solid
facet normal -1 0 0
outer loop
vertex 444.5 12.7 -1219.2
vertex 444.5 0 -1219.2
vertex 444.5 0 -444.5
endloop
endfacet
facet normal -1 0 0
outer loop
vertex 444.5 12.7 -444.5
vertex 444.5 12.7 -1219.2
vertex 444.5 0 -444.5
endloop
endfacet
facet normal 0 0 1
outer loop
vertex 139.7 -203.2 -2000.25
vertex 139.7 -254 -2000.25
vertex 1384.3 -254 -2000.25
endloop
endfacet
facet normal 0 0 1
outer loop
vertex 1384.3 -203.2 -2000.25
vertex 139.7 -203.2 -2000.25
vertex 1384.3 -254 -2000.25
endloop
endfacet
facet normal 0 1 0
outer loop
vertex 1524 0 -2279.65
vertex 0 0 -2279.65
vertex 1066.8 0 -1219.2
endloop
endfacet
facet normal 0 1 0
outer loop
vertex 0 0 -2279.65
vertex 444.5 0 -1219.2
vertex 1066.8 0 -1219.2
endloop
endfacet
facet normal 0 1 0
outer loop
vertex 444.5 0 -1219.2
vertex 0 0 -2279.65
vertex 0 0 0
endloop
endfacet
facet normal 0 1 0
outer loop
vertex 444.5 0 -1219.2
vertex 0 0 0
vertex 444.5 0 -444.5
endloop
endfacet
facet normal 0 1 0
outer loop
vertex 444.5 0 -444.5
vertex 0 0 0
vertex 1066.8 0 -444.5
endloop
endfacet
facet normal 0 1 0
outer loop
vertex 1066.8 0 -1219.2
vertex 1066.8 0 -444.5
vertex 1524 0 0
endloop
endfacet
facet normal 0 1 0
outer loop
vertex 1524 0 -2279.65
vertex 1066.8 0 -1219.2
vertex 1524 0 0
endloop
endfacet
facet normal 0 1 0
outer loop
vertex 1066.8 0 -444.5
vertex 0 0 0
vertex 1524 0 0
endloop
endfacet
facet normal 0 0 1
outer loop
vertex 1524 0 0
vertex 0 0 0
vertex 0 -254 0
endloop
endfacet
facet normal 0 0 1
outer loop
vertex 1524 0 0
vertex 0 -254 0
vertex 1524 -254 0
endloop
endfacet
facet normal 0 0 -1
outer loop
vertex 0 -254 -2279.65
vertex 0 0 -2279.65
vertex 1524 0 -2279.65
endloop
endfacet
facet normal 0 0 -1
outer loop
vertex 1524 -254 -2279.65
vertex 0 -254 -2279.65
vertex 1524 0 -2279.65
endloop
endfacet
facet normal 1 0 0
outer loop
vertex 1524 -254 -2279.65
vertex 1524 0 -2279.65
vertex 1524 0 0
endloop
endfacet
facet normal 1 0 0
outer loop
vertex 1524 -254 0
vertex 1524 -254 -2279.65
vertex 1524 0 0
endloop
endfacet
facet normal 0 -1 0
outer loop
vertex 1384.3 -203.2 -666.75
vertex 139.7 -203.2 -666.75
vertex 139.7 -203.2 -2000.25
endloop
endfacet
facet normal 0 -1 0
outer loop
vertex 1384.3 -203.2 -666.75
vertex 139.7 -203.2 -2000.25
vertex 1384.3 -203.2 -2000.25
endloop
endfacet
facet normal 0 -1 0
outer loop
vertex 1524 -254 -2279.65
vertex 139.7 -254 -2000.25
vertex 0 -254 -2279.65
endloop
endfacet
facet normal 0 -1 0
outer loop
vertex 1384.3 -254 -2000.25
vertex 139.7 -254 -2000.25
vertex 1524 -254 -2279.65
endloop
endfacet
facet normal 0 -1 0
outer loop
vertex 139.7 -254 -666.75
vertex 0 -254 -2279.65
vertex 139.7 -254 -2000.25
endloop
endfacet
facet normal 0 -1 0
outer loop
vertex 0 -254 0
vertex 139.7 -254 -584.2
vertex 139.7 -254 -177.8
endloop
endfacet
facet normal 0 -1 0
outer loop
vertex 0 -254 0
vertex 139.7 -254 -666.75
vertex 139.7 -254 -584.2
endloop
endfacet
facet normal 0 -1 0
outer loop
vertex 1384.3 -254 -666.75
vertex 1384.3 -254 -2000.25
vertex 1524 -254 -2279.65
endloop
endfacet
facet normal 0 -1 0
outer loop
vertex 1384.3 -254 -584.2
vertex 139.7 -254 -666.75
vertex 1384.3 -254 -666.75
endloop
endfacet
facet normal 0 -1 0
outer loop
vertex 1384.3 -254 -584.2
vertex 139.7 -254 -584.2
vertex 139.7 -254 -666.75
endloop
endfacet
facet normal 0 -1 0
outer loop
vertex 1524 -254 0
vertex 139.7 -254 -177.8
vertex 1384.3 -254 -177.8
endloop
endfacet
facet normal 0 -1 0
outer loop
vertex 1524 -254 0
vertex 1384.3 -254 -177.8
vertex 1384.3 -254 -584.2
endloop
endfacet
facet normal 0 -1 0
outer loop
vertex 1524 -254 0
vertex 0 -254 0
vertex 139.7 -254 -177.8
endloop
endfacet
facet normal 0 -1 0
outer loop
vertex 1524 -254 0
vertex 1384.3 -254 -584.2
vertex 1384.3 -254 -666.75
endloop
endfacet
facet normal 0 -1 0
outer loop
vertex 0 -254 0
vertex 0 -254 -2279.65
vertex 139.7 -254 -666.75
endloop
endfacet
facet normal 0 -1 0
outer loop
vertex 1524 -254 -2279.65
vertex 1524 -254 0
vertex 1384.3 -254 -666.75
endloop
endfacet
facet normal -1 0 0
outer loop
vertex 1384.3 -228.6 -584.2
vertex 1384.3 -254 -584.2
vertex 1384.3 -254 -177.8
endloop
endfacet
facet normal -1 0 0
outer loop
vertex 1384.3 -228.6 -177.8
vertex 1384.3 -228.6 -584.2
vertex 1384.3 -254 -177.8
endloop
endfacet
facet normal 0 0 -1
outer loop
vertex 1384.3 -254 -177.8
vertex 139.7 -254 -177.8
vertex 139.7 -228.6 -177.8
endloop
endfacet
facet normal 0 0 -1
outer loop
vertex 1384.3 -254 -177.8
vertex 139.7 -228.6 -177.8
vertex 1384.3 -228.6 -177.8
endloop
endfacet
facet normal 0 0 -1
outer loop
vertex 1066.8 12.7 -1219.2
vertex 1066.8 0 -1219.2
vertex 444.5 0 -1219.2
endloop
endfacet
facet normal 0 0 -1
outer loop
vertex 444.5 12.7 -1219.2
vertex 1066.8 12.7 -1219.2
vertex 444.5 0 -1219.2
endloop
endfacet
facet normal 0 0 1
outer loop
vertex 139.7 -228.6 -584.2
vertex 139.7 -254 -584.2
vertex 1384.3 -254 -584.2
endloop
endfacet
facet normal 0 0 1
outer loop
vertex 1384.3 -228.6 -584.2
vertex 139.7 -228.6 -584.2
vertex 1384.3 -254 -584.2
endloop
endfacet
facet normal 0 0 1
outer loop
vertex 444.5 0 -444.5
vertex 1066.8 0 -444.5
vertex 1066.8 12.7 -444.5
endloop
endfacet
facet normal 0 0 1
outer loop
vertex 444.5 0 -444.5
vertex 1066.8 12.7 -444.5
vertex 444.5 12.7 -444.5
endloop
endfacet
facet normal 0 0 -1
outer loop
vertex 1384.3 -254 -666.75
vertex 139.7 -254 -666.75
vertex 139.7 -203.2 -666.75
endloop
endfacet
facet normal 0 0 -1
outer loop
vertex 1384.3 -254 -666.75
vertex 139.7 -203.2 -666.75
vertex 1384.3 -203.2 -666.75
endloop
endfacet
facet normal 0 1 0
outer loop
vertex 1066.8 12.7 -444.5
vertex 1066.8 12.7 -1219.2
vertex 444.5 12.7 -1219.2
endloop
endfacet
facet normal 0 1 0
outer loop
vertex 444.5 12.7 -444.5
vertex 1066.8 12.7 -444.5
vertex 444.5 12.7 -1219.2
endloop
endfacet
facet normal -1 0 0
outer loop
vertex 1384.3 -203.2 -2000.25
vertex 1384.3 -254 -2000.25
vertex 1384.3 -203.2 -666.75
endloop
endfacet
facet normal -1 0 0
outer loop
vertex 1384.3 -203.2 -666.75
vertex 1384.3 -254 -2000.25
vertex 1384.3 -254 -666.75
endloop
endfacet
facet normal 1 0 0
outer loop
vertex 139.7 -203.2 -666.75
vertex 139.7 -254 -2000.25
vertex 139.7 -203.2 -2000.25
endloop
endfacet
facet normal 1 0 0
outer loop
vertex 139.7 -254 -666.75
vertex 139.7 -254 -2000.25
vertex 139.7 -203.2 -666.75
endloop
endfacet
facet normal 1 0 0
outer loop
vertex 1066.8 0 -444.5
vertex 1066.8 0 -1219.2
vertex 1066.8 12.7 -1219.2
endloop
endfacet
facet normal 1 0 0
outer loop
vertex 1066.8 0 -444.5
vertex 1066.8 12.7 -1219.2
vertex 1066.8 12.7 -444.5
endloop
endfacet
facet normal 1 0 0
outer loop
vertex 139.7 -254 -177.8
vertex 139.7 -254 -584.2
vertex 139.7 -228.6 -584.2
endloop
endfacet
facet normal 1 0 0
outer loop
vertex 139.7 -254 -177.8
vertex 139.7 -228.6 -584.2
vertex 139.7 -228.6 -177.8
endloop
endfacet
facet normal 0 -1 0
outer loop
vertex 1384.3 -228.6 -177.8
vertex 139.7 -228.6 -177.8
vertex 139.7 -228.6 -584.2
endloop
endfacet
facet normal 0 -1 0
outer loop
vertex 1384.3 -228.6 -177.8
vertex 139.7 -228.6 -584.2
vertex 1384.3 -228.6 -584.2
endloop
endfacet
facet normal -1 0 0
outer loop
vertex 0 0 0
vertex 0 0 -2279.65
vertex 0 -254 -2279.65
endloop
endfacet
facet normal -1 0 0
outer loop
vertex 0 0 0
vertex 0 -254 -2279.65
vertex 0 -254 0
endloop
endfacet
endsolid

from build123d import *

# Parameters (mm, degrees)
F0_W     = 1524
F0_H     = 2279.65
F1_DEPTH = 254
F2_W     = 1244.6
F2_H     = 406.4
F3_DEPTH = 25.4
F4_W     = 1244.6
F4_H     = 1333.5
F5_DEPTH = 50.8
F6_W     = 622.3
F6_H     = 774.7
F7_DEPTH = 12.7


with BuildPart() as f1:
    # F0 (on Front) → F1 (new body)
    with BuildSketch(Plane.XZ):
        with Locations((762, -1139.825)):
            Rectangle(F0_W, F0_H)
    extrude(amount=F1_DEPTH)

    # F2 (on face) → F3 (cut)
    with BuildSketch(Plane.XZ.offset(254)):
        with Locations((762, -381)):
            Rectangle(F2_W, F2_H)
    extrude(amount=-F3_DEPTH, mode=Mode.SUBTRACT)

    # F4 (on face) → F5 (cut)
    with BuildSketch(Plane.XZ.offset(254)):
        with Locations((762, -1333.5)):
            Rectangle(F4_W, F4_H)
    extrude(amount=-F5_DEPTH, mode=Mode.SUBTRACT)

    # F6 (on face) → F7 (join)
    with BuildSketch(Plane(origin=(0, 0, 0), x_dir=(-1, 0, 0), z_dir=(0, 1, 0))):
        with Locations((-755.65, -831.85)):
            Rectangle(F6_W, F6_H)
    extrude(amount=F7_DEPTH)


solid = f1.part
